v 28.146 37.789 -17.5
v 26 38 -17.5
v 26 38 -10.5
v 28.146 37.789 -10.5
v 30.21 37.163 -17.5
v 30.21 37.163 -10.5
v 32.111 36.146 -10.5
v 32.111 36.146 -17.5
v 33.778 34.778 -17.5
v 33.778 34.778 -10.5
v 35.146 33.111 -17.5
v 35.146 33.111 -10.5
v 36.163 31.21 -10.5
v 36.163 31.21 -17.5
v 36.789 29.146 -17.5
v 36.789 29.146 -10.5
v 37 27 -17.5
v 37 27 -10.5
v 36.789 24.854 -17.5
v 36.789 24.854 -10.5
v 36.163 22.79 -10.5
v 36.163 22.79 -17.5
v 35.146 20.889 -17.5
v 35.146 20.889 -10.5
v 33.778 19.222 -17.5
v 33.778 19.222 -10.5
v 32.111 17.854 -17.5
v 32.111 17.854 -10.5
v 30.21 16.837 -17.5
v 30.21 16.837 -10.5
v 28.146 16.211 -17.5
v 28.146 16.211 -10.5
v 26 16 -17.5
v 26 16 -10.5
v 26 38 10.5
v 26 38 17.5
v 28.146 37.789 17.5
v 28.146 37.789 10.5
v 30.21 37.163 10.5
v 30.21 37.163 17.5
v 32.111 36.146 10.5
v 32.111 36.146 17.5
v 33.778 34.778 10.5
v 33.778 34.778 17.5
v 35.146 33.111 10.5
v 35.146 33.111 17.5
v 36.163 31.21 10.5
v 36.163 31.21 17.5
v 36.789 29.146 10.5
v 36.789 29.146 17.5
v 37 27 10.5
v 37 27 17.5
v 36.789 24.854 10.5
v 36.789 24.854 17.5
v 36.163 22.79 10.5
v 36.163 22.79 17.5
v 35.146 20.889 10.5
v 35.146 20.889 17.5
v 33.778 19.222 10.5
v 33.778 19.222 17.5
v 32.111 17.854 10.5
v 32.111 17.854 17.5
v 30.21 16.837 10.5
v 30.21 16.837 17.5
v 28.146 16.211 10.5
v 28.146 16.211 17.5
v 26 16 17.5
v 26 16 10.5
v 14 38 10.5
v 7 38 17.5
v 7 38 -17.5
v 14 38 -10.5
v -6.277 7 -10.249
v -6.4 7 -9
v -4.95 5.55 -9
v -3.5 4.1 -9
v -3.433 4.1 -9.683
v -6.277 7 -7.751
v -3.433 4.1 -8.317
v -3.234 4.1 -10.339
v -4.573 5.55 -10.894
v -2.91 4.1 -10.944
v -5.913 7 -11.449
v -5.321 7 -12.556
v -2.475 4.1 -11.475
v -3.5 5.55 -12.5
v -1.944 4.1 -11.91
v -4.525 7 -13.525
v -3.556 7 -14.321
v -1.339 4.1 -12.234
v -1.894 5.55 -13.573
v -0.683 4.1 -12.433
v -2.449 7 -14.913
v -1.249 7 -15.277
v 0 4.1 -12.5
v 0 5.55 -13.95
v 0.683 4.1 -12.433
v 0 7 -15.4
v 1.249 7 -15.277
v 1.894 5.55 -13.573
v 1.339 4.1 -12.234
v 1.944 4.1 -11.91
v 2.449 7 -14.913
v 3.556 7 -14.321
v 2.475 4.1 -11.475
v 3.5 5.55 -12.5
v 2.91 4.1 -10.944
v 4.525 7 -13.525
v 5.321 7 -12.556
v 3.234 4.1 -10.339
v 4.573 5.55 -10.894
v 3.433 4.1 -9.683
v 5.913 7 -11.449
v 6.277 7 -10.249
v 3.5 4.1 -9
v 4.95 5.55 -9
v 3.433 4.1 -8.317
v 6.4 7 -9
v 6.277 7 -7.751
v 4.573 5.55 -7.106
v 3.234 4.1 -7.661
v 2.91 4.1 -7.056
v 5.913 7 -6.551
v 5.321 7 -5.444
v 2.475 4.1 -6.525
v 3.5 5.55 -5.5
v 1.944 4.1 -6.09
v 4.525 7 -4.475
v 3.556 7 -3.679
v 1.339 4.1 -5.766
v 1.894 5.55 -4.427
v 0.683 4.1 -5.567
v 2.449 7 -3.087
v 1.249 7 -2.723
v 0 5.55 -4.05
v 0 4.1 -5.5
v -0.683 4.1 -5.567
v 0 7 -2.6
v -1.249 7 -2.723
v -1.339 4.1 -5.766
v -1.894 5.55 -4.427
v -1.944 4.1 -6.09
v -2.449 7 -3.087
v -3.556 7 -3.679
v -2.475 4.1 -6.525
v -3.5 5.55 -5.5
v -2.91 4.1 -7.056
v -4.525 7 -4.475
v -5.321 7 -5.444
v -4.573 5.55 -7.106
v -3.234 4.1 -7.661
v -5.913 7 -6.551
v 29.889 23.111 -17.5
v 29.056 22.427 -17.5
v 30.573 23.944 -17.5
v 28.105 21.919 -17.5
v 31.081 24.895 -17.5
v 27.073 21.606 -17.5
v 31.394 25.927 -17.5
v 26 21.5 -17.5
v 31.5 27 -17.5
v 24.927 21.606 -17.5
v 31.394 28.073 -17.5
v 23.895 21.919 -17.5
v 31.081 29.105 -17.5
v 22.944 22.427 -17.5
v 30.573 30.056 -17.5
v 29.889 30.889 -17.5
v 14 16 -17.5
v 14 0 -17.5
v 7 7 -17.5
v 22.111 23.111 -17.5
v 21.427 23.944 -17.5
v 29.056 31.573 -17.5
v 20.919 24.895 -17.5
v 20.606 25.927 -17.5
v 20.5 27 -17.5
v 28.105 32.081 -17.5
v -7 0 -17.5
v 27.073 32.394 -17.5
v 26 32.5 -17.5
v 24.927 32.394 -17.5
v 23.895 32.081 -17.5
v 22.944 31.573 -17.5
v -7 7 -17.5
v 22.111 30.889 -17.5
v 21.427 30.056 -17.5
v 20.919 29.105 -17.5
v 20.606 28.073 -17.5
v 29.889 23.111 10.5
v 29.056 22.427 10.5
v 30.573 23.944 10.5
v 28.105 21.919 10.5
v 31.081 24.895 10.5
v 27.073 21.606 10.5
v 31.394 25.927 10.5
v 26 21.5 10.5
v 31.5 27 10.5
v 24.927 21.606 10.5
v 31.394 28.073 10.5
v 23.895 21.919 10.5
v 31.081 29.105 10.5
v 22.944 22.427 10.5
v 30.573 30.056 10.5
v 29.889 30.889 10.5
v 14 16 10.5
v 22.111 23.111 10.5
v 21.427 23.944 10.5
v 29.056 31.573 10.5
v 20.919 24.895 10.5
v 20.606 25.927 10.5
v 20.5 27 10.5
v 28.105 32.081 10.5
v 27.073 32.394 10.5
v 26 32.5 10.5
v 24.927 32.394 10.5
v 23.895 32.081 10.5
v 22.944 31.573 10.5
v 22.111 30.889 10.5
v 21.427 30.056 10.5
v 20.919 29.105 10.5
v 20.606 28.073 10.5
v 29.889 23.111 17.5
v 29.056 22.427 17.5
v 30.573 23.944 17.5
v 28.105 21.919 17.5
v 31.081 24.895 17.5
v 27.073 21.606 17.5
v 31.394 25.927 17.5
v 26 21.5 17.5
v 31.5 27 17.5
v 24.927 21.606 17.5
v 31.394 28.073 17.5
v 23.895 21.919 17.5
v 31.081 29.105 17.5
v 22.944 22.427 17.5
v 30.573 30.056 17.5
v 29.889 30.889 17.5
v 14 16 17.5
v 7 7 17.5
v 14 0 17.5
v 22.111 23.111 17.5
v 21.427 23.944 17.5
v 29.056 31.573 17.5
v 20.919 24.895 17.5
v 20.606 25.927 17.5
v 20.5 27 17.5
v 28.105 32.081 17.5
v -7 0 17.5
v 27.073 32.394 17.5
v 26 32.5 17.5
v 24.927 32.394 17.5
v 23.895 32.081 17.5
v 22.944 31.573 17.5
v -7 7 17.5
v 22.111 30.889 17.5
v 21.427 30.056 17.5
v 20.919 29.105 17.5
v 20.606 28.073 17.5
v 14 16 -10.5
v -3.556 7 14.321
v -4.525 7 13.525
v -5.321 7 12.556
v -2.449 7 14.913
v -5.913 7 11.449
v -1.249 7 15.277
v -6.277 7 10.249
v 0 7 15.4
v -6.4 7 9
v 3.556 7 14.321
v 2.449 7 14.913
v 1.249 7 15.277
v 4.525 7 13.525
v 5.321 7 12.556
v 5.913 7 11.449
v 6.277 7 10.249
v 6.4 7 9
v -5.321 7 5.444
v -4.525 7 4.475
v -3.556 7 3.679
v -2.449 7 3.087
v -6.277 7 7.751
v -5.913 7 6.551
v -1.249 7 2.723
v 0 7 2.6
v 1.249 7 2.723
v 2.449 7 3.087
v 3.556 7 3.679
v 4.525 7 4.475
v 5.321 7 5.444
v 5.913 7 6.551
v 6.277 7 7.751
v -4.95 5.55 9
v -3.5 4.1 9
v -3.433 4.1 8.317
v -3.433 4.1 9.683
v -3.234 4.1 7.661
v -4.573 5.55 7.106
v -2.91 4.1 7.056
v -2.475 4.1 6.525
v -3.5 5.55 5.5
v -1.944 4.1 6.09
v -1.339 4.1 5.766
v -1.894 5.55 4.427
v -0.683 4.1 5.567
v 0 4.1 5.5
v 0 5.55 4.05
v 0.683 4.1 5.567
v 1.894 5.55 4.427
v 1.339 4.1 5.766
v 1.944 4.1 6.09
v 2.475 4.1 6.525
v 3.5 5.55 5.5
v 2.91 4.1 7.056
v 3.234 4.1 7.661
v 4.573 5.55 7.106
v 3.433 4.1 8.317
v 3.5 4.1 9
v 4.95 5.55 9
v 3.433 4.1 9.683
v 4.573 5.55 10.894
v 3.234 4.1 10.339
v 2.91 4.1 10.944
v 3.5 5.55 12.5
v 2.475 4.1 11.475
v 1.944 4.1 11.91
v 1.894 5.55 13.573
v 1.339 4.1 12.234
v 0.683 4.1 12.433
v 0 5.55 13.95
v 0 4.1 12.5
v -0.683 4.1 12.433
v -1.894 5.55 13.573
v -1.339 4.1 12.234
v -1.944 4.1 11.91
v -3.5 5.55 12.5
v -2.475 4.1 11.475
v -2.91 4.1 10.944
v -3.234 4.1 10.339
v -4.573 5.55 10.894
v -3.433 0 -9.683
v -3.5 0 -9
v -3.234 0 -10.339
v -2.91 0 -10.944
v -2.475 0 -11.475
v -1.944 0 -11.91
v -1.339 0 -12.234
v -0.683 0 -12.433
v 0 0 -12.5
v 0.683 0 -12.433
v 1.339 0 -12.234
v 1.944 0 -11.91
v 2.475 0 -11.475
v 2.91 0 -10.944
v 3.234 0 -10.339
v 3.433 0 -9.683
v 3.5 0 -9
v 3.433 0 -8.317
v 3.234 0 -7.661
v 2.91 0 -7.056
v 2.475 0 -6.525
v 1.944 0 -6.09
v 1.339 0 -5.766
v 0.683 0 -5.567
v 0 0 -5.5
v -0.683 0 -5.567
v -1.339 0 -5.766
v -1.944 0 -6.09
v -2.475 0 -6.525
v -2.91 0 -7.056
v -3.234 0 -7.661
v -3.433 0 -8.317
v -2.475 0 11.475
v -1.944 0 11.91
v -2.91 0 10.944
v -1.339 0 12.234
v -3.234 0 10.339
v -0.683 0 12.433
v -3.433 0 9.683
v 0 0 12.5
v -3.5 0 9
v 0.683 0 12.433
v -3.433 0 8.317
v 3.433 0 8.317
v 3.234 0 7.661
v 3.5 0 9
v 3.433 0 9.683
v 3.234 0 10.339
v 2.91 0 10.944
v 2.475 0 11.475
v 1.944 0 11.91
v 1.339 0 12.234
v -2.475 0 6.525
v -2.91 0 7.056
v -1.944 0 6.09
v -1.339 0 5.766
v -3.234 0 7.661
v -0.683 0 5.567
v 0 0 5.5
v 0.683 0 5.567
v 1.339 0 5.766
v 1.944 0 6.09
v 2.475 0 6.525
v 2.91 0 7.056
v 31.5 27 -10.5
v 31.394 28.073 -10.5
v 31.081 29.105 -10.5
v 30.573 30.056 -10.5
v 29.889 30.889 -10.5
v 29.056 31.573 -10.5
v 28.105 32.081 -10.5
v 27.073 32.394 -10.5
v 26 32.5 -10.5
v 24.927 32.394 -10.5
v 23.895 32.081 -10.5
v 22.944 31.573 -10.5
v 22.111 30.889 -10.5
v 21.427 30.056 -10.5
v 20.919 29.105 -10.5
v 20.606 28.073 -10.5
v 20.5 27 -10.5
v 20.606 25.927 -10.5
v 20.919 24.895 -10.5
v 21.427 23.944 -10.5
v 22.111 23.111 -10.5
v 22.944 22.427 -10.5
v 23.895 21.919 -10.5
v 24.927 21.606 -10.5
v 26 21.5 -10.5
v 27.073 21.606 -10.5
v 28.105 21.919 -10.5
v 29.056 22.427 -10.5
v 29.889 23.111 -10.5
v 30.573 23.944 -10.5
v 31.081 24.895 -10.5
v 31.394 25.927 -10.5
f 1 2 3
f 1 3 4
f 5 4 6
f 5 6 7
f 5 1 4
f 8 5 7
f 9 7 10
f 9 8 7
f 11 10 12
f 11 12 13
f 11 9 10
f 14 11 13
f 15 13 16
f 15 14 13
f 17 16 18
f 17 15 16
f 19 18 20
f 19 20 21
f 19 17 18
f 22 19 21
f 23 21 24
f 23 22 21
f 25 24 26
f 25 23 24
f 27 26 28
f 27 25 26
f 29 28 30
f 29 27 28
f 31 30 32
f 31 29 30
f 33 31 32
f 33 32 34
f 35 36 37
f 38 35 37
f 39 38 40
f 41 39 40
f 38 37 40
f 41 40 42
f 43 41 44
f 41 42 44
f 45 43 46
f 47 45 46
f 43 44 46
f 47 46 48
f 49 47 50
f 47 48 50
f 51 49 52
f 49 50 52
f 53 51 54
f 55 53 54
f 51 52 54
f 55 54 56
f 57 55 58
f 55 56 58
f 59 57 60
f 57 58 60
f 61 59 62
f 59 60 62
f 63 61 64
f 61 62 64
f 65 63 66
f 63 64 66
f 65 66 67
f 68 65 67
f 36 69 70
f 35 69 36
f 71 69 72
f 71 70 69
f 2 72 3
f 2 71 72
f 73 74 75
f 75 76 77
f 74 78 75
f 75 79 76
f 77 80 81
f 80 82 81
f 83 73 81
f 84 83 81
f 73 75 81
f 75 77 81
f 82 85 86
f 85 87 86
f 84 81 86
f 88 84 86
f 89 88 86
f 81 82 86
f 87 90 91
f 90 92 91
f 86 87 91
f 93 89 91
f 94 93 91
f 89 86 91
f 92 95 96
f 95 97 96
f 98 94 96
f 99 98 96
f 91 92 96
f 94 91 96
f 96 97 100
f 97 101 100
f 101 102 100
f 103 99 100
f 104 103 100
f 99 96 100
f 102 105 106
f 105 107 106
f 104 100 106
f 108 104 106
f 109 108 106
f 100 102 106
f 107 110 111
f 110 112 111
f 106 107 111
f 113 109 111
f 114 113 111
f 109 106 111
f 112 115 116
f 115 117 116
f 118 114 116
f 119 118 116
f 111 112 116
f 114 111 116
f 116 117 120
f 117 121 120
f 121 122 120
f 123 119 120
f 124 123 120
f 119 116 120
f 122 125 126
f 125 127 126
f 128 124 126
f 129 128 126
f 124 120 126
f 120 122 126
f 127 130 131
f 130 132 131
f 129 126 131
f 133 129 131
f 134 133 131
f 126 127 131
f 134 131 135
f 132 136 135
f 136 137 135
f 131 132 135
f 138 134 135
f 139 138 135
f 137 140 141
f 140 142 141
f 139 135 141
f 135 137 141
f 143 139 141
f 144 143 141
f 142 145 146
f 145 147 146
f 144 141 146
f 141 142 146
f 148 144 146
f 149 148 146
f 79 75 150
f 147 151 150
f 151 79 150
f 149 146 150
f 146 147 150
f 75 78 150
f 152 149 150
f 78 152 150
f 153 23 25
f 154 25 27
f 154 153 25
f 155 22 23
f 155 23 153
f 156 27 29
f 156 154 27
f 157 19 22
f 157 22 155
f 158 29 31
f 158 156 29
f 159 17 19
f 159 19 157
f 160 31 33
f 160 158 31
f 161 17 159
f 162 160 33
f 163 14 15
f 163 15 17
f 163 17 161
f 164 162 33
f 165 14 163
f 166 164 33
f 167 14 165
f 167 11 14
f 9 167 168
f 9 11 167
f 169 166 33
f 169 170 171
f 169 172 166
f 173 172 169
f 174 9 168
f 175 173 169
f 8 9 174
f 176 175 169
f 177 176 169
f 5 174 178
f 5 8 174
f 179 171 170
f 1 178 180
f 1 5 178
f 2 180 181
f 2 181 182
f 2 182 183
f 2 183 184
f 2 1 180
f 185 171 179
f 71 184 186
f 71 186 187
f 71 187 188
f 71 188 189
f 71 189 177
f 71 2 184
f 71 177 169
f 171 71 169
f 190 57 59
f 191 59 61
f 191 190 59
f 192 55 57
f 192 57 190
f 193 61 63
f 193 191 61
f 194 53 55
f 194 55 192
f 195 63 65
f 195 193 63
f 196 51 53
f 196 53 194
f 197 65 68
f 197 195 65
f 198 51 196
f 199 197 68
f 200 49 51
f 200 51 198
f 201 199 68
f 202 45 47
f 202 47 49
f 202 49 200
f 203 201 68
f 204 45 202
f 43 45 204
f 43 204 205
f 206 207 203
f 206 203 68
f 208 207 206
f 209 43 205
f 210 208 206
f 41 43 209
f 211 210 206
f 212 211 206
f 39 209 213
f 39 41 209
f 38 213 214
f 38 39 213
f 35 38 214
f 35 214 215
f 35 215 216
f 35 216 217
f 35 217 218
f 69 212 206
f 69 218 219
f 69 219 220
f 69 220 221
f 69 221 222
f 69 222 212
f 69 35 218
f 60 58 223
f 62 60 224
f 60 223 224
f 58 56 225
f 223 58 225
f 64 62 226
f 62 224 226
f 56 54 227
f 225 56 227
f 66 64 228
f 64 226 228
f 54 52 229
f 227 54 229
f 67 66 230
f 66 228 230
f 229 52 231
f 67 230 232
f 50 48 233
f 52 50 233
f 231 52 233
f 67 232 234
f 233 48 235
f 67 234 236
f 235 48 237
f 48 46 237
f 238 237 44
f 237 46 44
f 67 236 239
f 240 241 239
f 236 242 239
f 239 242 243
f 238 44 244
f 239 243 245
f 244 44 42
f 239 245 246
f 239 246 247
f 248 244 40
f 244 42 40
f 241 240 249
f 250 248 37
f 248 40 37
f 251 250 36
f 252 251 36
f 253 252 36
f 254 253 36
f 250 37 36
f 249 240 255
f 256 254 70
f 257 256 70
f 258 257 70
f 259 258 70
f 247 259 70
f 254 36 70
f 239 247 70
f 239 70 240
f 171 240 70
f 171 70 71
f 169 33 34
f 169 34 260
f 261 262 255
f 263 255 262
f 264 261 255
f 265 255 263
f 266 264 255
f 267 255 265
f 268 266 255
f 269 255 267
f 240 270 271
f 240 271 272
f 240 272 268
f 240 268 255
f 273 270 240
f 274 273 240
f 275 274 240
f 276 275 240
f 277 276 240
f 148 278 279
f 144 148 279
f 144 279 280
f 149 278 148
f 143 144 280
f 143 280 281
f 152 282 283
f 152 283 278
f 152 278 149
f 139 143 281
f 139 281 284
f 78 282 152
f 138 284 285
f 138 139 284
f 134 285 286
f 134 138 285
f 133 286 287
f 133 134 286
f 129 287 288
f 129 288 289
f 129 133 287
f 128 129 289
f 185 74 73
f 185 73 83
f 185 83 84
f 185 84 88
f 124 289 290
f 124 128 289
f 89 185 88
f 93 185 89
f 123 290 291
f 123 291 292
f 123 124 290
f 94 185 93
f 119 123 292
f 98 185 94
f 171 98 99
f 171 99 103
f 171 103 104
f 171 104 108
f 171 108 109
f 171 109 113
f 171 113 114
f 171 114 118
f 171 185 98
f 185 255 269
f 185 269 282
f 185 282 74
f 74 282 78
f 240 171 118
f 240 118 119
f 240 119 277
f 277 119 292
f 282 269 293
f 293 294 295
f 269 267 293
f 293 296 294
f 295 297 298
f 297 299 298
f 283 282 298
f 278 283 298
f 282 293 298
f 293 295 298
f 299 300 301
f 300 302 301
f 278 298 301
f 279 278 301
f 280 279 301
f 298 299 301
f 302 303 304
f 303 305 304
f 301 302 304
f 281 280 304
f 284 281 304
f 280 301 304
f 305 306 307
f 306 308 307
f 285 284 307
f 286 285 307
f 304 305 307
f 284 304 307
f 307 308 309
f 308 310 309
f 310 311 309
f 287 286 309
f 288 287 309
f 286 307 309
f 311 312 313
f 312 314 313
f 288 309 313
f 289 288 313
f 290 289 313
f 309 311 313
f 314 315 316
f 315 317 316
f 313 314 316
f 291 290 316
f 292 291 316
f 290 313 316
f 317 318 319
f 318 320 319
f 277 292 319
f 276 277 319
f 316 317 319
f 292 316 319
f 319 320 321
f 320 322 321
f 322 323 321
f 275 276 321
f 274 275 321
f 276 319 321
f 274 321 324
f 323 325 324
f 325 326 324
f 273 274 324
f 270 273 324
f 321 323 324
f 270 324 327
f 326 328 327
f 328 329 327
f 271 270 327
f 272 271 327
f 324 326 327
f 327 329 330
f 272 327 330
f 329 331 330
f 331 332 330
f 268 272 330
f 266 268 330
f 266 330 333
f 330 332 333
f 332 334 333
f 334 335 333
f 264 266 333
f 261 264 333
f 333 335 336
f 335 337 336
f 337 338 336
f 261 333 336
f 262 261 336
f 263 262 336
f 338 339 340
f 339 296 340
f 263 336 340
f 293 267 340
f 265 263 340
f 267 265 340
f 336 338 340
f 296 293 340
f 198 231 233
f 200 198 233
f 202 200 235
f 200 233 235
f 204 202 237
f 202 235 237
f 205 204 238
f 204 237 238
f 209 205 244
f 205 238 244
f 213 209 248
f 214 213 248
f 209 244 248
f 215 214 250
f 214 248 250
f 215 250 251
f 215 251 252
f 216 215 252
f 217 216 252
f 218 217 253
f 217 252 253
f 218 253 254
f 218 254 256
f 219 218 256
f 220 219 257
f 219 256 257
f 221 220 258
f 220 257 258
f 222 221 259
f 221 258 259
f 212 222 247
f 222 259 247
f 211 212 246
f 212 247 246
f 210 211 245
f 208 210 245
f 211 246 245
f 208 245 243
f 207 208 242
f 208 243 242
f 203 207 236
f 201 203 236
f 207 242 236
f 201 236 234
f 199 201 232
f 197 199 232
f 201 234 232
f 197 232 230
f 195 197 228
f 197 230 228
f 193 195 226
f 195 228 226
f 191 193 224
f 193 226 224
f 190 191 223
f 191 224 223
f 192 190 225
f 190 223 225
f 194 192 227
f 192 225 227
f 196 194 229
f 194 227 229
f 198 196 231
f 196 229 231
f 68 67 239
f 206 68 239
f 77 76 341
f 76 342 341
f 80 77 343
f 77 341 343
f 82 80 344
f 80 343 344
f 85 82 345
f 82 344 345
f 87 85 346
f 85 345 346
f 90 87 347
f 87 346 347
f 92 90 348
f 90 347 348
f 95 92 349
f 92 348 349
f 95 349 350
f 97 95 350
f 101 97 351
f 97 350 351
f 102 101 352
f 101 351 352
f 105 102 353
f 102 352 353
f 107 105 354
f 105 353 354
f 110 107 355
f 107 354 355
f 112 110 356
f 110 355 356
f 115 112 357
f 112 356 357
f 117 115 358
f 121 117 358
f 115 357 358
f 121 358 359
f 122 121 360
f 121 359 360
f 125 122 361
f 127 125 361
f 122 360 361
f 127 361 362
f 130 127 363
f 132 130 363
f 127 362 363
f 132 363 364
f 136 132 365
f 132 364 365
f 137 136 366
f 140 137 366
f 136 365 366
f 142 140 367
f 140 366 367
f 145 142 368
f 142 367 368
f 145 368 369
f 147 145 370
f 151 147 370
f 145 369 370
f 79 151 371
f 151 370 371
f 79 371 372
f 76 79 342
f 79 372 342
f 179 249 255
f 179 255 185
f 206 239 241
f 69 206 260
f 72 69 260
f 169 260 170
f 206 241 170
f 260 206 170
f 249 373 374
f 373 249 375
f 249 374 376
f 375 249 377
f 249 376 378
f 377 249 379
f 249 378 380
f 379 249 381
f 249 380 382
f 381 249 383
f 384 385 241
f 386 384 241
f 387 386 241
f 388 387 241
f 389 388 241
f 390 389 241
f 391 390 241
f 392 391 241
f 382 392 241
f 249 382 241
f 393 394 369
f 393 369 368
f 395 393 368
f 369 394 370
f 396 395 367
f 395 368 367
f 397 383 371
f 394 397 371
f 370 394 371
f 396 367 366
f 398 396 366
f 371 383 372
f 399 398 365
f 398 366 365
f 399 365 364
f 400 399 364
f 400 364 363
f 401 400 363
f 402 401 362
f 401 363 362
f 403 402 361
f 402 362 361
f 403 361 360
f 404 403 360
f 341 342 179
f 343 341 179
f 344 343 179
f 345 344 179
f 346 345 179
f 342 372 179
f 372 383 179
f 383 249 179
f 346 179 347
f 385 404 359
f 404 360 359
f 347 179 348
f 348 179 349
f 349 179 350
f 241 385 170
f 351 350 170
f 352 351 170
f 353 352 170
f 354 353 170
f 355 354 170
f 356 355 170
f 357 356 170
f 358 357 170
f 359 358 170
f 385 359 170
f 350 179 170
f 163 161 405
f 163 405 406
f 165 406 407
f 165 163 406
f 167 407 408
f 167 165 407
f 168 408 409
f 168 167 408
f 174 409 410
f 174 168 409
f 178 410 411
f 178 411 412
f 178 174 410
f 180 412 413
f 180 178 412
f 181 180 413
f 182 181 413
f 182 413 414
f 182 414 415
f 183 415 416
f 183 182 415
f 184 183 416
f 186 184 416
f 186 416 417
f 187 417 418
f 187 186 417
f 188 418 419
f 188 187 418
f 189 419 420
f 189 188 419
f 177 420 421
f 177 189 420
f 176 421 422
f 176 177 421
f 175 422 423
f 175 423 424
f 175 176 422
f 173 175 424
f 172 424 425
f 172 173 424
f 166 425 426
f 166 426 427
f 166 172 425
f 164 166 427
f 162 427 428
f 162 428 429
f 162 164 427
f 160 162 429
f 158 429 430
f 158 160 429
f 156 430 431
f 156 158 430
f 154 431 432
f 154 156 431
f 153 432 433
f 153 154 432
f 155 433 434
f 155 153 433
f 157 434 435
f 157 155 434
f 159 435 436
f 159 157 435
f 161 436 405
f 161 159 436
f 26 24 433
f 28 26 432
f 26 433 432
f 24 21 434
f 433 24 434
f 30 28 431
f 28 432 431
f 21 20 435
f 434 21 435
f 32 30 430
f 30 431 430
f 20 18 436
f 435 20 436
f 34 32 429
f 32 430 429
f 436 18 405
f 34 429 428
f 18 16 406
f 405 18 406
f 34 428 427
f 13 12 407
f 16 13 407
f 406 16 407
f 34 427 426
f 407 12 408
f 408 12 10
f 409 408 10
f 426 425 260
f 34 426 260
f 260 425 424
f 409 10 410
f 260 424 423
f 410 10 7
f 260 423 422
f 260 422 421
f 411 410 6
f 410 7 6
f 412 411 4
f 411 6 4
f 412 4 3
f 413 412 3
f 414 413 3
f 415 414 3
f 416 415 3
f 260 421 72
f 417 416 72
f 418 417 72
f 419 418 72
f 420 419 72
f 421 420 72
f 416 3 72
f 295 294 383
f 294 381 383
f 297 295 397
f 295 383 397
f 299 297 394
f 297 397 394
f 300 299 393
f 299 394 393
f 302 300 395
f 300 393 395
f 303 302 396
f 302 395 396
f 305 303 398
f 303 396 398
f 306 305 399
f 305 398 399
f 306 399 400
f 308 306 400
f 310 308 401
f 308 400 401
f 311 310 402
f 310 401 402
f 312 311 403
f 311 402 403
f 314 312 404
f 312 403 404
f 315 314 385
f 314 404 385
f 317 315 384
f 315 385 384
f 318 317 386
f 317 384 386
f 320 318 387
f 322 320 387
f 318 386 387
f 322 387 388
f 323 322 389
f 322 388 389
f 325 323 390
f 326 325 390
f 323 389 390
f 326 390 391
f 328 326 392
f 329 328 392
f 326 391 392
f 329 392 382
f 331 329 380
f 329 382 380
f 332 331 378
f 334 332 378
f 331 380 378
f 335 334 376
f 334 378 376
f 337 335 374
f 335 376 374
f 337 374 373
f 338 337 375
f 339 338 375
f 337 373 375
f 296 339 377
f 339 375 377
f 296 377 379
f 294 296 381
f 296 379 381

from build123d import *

# Parameters (mm, degrees)
SKETCH_1_W                   = 14
SKETCH_1_H                   = 35
EXTRUDE_1_DEPTH              = 7
HOLE_WIZARD_M6_1_D           = 7
HOLE_WIZARD_M6_1_CSINK_D     = 12.8
HOLE_WIZARD_M6_1_CSINK_ANGLE = 90
SKETCH_6_W                   = 7
SKETCH_6_H                   = 35
EXTRUDE_2_DEPTH              = 38
SKETCH_7_R                   = 5.5
EXTRUDE_3_DEPTH              = 7


with BuildPart() as part:
    # 草图1 → 凸台-拉伸1 (new body)
    with BuildSketch(Plane(origin=(0, 0, 0), x_dir=(1, 0, 0), z_dir=(0, 1, 0))):
        Rectangle(SKETCH_1_W, SKETCH_1_H)
    extrude(amount=EXTRUDE_1_DEPTH)

    # M6 内六角花形半沉头螺钉的锥形沉头孔1 (through all)
    with Locations(Plane(origin=(0, 7, 0), x_dir=(1, 0, 0), z_dir=(0, 1, 0))):
        with Locations((0, -9), (0, 9)):
            CounterSinkHole(HOLE_WIZARD_M6_1_D / 2, HOLE_WIZARD_M6_1_CSINK_D / 2, counter_sink_angle=HOLE_WIZARD_M6_1_CSINK_ANGLE)

    # 草图6 → 凸台-拉伸2 (add)
    with BuildSketch(Plane(origin=(0, 0, 0), x_dir=(1, 0, 0), z_dir=(0, 1, 0))):
        with Locations((10.5, 0)):
            Rectangle(SKETCH_6_W, SKETCH_6_H)
    extrude(amount=EXTRUDE_2_DEPTH)

    # 草图7 → 凸台-拉伸3 (add)
    with BuildSketch(Plane.XY.offset(17.5)):
        with BuildLine():
            Line((14, 38), (26, 38))
            ThreePointArc((26, 38), (37, 27), (26, 16))
            Line((26, 16), (14, 16))
            Line((14, 16), (14, 38))
        make_face()
        with Locations((26, 27)):
            Circle(SKETCH_7_R, mode=Mode.SUBTRACT)
    extrude_3 = extrude(amount=-EXTRUDE_3_DEPTH)

    # 镜向1: 凸台-拉伸3 across plane
    add(extrude_3.mirror(Plane.XY))


solid = part.part
